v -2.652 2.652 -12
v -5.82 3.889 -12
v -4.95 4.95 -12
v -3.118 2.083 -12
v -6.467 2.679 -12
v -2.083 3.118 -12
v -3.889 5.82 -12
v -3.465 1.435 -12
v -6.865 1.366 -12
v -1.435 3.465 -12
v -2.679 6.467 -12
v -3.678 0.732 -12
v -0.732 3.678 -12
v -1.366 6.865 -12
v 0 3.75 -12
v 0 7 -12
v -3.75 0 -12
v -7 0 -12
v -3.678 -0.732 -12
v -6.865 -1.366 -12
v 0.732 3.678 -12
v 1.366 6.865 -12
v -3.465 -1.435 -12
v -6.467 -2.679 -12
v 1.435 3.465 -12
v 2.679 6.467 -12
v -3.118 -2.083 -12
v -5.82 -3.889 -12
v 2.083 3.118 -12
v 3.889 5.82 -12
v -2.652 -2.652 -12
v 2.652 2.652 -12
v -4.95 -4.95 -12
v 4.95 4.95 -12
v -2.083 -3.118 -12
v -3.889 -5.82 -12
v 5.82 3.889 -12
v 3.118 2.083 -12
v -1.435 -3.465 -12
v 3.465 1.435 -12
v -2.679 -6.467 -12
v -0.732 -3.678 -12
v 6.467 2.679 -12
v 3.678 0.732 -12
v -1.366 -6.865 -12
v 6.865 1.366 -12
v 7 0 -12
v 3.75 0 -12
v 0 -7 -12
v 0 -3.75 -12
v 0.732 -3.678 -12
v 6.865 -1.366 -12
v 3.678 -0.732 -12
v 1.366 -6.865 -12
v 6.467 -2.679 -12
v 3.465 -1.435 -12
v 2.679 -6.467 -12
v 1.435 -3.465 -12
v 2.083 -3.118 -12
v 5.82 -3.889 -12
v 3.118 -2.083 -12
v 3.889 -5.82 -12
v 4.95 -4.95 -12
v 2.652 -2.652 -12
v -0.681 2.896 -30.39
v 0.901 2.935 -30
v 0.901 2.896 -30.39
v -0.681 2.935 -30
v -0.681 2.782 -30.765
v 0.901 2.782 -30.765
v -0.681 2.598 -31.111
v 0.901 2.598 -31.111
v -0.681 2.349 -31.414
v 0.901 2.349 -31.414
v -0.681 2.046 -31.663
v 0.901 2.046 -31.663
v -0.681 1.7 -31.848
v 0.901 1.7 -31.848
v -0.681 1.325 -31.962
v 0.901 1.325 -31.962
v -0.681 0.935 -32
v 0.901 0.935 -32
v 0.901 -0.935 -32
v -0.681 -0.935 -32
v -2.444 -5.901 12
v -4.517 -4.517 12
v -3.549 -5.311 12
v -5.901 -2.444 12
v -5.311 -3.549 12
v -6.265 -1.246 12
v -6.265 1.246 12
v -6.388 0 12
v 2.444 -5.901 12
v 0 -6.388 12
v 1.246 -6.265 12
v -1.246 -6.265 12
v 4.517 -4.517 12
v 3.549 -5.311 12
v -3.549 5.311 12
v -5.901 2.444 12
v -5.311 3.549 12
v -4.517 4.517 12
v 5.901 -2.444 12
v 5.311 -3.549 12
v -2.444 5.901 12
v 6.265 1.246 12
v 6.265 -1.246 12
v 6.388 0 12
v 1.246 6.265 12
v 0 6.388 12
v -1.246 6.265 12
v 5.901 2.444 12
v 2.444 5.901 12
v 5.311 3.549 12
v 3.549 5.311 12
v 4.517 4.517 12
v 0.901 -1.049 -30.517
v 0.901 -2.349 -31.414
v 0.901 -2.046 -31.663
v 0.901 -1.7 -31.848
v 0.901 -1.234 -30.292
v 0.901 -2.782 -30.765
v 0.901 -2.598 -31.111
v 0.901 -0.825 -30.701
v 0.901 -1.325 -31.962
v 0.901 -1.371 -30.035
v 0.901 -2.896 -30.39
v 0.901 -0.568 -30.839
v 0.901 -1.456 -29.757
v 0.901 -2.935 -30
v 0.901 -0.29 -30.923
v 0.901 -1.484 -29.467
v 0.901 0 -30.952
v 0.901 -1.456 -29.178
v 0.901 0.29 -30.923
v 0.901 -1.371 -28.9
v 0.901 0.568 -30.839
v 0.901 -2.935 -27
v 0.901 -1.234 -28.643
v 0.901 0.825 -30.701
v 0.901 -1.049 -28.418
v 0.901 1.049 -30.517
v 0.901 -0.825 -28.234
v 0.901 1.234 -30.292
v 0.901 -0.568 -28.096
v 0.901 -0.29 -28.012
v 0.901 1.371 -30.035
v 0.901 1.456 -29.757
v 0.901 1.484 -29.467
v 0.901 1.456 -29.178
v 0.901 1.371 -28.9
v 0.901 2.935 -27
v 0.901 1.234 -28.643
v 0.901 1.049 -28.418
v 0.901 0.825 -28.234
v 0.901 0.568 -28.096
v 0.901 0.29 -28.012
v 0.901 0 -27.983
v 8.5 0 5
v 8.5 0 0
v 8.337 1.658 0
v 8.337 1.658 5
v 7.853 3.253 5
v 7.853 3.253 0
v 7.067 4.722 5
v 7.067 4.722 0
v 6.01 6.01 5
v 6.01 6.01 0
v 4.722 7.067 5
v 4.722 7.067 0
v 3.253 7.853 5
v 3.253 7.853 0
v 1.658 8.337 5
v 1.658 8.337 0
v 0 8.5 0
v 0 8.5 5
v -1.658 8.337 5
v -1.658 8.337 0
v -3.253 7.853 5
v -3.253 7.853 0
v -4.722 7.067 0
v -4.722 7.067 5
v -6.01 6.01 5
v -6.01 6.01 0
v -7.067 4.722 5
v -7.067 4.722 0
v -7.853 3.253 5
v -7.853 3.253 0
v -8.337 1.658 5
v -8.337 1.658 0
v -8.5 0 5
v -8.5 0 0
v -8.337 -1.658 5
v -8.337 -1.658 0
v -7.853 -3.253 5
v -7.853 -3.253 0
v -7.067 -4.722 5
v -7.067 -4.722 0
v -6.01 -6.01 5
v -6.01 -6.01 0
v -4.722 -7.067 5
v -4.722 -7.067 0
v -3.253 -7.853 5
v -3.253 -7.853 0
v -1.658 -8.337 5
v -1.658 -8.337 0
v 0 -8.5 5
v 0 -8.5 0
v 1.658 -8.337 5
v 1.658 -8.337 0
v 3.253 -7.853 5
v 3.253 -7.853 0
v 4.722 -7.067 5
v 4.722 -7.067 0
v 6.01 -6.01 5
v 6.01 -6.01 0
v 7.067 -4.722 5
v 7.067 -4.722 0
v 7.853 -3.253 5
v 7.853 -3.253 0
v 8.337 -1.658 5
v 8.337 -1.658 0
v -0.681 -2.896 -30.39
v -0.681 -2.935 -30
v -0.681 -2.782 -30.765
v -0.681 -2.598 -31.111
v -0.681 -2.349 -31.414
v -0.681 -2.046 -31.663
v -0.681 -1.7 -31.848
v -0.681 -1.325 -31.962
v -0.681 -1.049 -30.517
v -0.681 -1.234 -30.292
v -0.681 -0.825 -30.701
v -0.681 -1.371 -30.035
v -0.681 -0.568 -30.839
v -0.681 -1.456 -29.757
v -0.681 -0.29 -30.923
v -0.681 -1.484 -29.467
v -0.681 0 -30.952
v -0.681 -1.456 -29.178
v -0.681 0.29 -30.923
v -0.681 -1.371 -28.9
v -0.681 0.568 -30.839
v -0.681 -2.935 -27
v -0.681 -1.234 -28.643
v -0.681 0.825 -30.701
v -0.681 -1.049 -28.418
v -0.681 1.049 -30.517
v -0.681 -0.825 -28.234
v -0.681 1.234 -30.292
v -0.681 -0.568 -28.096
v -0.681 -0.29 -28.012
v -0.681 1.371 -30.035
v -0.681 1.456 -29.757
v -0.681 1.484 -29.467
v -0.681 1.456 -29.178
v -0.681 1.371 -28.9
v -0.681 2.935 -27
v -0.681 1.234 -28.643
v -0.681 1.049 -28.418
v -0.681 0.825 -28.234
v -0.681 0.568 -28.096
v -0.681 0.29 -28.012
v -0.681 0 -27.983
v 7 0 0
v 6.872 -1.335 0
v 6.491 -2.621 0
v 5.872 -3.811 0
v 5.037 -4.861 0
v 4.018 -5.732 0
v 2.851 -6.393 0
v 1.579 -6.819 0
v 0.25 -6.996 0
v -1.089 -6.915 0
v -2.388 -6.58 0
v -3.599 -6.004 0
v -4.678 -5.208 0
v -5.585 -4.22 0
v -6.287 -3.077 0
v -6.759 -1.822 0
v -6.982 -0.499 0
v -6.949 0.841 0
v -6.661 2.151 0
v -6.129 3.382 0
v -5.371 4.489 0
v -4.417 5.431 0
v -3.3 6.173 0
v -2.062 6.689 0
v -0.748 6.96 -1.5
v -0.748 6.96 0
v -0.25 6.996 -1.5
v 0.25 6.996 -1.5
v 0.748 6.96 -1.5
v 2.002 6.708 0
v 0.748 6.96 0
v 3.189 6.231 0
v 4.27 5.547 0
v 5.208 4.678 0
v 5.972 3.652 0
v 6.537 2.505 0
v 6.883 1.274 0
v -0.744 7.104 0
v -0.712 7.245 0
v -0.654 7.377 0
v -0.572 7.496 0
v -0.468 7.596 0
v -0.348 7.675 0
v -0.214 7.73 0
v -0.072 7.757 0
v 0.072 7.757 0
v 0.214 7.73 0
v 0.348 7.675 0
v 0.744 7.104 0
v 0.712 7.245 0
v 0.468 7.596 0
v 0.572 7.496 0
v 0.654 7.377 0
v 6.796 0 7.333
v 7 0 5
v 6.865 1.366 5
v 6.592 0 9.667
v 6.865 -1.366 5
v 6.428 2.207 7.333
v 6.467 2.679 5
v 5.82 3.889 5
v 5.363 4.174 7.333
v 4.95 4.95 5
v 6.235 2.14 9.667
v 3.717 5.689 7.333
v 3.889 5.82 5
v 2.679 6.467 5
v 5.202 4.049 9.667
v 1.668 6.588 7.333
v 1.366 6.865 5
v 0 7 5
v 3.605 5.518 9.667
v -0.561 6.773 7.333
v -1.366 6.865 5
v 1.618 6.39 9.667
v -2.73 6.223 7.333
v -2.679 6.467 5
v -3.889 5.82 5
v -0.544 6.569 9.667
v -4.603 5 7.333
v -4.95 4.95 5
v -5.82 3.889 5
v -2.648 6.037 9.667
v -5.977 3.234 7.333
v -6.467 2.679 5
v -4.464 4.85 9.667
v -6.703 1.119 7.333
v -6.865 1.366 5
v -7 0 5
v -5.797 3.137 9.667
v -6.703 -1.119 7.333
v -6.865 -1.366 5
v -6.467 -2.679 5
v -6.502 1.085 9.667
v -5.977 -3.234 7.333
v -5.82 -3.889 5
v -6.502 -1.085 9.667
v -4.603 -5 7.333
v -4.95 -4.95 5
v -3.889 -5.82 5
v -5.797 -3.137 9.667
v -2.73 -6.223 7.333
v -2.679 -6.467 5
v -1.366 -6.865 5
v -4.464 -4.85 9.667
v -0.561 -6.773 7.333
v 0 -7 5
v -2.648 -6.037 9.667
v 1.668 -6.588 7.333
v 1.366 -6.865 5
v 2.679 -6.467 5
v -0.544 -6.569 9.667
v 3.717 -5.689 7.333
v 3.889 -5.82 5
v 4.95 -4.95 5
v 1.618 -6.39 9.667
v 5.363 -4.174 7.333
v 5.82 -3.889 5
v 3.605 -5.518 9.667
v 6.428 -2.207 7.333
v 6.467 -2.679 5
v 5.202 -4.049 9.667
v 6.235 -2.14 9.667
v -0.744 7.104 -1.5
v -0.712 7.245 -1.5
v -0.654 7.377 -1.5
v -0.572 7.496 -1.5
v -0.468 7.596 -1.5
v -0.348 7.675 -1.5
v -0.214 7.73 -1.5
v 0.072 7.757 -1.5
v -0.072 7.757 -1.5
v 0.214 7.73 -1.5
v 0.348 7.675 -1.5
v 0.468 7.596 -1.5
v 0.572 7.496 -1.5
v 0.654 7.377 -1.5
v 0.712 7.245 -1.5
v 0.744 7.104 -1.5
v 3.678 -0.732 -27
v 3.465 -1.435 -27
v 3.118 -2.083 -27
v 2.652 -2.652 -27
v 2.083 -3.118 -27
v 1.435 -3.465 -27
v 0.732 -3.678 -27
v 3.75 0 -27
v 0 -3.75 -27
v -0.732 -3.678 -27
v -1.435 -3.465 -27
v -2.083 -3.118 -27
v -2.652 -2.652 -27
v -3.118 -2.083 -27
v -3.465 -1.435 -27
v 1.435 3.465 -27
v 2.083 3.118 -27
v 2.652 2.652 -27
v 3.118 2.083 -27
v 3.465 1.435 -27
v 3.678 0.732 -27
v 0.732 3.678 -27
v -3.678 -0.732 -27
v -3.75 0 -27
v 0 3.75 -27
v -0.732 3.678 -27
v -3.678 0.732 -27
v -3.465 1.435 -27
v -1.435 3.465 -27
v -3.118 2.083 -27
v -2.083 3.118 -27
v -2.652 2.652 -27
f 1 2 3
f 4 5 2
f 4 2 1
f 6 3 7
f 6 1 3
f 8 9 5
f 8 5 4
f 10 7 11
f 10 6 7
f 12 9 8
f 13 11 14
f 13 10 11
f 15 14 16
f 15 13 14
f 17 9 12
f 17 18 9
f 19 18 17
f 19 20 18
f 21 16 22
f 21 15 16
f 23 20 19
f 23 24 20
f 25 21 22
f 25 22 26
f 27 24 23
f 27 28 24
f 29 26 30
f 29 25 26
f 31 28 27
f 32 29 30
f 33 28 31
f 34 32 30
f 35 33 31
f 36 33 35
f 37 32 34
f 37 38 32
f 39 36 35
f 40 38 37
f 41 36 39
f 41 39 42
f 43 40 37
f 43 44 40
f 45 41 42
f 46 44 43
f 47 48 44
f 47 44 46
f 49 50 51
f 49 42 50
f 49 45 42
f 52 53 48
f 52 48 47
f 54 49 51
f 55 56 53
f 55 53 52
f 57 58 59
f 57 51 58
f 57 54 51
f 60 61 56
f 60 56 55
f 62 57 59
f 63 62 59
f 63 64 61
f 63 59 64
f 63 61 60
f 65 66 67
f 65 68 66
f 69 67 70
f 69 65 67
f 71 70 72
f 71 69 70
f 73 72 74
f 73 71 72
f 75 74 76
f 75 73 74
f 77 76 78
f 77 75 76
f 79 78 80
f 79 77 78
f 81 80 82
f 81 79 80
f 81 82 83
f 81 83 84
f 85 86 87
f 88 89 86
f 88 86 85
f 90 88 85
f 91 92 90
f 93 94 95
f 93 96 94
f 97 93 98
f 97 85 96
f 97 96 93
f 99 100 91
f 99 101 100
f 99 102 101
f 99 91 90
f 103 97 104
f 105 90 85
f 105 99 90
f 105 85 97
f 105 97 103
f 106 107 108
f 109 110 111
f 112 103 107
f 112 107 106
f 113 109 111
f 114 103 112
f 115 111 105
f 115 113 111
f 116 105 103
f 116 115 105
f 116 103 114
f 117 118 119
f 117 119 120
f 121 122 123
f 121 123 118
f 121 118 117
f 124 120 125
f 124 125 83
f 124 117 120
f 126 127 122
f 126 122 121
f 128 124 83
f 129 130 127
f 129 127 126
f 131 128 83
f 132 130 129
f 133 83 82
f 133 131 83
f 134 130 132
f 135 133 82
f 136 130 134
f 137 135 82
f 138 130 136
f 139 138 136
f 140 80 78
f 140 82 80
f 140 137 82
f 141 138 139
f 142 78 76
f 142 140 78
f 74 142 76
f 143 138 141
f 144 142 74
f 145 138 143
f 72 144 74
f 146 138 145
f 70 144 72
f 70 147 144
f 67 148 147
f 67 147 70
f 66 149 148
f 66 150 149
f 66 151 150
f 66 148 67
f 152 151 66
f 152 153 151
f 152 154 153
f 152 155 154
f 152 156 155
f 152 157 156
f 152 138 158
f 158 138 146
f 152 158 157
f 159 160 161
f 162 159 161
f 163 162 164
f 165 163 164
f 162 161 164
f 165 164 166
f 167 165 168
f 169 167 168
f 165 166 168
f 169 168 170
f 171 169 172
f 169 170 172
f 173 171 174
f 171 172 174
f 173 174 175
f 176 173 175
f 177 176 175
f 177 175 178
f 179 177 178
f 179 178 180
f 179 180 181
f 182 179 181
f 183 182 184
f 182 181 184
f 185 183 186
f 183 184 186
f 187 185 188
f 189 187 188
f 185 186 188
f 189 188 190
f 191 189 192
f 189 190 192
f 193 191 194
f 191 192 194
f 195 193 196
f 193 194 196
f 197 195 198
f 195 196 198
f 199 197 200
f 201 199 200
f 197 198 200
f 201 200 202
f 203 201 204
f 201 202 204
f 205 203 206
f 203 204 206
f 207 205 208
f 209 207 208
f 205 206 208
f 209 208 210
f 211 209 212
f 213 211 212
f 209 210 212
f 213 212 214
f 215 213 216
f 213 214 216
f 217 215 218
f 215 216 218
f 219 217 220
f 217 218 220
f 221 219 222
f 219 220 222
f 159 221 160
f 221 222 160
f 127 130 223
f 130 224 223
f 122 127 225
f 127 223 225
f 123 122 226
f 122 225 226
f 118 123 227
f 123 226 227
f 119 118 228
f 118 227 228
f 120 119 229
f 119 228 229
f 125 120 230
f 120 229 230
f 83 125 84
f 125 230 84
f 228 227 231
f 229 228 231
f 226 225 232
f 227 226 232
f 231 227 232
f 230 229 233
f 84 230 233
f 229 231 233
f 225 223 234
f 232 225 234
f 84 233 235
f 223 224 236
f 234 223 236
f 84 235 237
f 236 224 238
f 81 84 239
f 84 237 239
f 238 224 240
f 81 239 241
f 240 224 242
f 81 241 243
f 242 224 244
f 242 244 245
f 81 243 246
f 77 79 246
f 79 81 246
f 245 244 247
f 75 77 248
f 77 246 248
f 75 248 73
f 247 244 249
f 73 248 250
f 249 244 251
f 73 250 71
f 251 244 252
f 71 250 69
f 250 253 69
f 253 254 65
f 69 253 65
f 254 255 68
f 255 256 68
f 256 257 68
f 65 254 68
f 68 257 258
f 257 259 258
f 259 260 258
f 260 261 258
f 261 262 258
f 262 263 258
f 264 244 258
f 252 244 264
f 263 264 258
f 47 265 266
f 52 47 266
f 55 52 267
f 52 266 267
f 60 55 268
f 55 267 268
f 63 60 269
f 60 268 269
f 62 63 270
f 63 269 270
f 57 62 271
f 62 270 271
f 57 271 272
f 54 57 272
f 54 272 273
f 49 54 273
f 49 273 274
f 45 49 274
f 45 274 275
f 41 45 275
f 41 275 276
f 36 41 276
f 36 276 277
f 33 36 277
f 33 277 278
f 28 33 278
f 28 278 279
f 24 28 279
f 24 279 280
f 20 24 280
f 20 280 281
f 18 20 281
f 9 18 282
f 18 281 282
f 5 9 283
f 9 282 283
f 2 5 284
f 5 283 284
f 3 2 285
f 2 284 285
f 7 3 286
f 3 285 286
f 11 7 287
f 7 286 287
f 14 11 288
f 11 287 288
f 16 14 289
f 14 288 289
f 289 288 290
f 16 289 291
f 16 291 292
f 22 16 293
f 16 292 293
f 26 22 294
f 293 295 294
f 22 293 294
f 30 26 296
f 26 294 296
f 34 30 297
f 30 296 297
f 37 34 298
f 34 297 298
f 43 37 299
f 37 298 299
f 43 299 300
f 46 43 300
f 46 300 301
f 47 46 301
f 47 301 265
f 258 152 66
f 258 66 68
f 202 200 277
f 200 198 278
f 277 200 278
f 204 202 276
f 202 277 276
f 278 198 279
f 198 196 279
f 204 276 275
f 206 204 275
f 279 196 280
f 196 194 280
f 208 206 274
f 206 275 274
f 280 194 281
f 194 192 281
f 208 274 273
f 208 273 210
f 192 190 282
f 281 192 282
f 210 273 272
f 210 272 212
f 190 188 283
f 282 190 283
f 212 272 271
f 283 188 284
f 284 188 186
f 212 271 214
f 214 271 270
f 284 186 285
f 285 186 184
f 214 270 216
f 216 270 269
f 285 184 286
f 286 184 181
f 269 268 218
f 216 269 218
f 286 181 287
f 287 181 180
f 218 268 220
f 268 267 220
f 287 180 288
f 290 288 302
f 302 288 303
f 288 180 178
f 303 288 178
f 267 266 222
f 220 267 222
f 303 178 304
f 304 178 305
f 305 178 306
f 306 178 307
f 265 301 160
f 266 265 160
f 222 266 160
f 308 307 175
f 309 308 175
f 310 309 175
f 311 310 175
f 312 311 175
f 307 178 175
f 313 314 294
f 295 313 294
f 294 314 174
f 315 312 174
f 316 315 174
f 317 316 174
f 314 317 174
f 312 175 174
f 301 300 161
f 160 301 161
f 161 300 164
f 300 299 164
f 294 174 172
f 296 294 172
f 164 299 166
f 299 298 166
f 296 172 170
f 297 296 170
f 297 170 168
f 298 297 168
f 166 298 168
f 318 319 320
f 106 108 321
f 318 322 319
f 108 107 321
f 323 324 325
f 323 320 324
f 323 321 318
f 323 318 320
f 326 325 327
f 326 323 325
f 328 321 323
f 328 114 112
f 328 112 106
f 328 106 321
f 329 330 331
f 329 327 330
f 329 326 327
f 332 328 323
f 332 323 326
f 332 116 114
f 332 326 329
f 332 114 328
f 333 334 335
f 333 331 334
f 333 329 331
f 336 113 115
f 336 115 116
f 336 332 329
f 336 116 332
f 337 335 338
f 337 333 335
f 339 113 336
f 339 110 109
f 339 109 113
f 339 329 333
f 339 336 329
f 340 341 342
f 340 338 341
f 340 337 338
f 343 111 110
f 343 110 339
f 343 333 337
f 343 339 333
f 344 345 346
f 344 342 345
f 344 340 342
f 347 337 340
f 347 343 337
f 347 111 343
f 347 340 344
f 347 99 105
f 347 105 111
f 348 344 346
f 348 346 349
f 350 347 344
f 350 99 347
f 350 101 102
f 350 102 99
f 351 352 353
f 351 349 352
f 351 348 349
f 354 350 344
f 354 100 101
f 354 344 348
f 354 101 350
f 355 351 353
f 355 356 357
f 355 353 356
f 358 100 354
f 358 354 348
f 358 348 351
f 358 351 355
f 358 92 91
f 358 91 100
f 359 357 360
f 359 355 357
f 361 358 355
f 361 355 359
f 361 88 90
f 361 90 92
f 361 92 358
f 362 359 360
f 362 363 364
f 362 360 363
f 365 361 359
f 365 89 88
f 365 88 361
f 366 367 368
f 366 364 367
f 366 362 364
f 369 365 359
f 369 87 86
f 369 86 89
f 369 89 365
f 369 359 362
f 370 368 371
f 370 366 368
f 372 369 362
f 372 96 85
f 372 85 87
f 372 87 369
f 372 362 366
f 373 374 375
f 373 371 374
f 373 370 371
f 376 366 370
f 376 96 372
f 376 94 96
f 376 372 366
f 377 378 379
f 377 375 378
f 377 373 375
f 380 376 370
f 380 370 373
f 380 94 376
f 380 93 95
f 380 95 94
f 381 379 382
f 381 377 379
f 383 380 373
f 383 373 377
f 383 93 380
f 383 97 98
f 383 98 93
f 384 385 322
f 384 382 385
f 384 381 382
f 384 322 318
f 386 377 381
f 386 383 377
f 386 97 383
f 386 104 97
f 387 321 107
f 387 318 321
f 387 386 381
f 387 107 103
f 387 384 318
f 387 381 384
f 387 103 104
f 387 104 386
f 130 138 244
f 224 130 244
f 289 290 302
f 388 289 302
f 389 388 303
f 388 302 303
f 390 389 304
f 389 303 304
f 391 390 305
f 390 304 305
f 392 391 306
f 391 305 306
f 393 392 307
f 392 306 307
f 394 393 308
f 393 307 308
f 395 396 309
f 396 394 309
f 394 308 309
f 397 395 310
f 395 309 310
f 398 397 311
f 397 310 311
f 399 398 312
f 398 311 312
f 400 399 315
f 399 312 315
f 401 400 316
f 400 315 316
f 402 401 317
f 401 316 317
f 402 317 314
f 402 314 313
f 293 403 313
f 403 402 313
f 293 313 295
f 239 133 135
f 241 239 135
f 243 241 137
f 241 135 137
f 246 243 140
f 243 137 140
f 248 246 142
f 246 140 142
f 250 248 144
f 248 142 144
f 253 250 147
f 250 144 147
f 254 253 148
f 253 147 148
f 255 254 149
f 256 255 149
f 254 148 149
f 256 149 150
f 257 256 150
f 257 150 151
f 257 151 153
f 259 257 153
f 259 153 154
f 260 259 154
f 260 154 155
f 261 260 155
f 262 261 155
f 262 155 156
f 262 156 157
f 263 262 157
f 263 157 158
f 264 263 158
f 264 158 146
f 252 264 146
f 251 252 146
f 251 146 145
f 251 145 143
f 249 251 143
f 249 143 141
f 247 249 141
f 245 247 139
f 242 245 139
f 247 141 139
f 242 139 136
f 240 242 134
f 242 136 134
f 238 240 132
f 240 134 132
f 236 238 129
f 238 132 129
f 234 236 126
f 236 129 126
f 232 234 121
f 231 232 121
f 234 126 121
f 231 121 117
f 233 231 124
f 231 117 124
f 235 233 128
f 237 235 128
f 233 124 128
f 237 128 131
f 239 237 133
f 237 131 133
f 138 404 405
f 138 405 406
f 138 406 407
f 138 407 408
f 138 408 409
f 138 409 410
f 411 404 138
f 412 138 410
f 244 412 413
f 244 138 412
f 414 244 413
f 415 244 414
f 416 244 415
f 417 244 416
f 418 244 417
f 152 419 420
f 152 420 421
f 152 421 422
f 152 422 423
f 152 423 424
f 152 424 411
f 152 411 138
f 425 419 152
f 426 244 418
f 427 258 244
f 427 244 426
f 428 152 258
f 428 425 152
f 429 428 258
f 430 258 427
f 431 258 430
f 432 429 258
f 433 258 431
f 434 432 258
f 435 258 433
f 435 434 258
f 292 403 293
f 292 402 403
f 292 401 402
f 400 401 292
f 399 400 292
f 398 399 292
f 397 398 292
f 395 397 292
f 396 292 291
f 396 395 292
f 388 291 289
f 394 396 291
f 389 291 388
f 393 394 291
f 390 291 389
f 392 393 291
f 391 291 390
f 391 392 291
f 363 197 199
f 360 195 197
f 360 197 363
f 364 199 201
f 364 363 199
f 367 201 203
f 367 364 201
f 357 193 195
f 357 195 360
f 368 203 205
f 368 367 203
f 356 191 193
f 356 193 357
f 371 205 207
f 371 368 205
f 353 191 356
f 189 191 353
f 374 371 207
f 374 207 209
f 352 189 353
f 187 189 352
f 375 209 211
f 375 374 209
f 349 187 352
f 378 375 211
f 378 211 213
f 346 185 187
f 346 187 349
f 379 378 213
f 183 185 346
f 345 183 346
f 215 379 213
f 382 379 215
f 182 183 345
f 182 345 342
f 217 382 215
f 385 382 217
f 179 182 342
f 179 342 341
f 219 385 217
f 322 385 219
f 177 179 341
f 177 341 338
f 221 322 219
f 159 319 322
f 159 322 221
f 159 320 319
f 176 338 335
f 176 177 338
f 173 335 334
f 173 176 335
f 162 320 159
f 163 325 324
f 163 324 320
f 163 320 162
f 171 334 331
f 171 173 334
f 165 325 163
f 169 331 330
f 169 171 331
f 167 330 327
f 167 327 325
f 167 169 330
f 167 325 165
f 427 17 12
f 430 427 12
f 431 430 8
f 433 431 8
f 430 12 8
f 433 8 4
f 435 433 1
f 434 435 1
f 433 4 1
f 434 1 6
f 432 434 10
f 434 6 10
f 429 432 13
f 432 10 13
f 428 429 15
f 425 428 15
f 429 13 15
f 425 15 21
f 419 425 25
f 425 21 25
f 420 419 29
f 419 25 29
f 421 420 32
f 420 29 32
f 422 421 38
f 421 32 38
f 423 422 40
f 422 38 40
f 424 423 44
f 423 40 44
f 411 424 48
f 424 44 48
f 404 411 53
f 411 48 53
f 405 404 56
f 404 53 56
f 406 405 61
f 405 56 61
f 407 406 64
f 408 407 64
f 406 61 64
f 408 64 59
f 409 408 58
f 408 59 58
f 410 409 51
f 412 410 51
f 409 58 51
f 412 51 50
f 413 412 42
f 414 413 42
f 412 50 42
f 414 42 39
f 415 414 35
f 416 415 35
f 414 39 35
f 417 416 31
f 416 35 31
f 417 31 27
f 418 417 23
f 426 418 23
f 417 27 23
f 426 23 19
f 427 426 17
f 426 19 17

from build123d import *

# Parameters (mm, degrees)
SKETCH_1_R          = 8.5
EXTRUDE_1_DEPTH     = 5
SKETCH_2_R          = 7
EXTRUDE_2_DEPTH     = 7
EXTRUDE_2_TAPER     = 5
SKETCH_3_R          = 7
EXTRUDE_3_DEPTH     = 12
SKETCH_4_R          = 3.75
EXTRUDE_4_DEPTH     = 15
SKETCH_5_W          = 1.582755529
SKETCH_5_H          = 5.869385088
EXTRUDE_5_DEPTH     = 5
SKETCH_6_R          = 1.484108277
CUT_EXTRUDE_1_DEPTH = 5
FILLET_1_R          = 2
SKETCH_7_R          = 0.75
EXTRUDE_6_DEPTH     = 1.5


with BuildPart() as part:
    # Эскиз1 → Бобышка-Вытянуть1 (new body)
    with BuildSketch(Plane.XY):
        Circle(SKETCH_1_R)
    extrude(amount=EXTRUDE_1_DEPTH)

    # Эскиз2 → Бобышка-Вытянуть2 (add)
    with BuildSketch(Plane.XY.offset(5)):
        Circle(SKETCH_2_R)
    extrude(amount=EXTRUDE_2_DEPTH, taper=EXTRUDE_2_TAPER)

    # Эскиз3 → Бобышка-Вытянуть3 (add)
    with BuildSketch(Plane(origin=(0, 0, 0), x_dir=(-1, 0, 0), z_dir=(0, 0, -1))):
        with Locations(Location((0, 0, 0), (0, 0, 180))):
            Circle(SKETCH_3_R)
    extrude(amount=EXTRUDE_3_DEPTH)

    # Эскиз4 → Бобышка-Вытянуть4 (add)
    with BuildSketch(Plane(origin=(0, 0, -12), x_dir=(-1, 0, 0), z_dir=(0, 0, -1))):
        Circle(SKETCH_4_R)
    extrude(amount=EXTRUDE_4_DEPTH)

    # Эскиз5 → Бобышка-Вытянуть5 (add)
    with BuildSketch(Plane(origin=(0, 0, -27), x_dir=(-1, 0, 0), z_dir=(0, 0, -1))):
        with Locations((-0.109913578, 0)):
            Rectangle(SKETCH_5_W, SKETCH_5_H)
    extrude(amount=EXTRUDE_5_DEPTH)

    # Эскиз6 → Вырез-Вытянуть1 (cut)
    with BuildSketch(Plane(origin=(0.901291343, 0, 0), x_dir=(0, 0, -1), z_dir=(1, 0, 0))):
        with Locations((29.467495163, 0)):
            Circle(SKETCH_6_R)
    extrude(amount=-CUT_EXTRUDE_1_DEPTH, mode=Mode.SUBTRACT)

    # Скругление1
    fillet_1_edges = [part.edges().sort_by_distance(p)[0] for p in [
        (0.109913578, -2.934692544, -32),
        (0.109913578, 2.934692544, -32),
    ]]
    fillet(fillet_1_edges, radius=FILLET_1_R)

    # Эскиз7 → Бобышка-Вытянуть6 (add)
    with BuildSketch(Plane(origin=(0, 0, 0), x_dir=(-1, 0, 0), z_dir=(0, 0, -1))):
        with Locations((0, 7.010668314)):
            Circle(SKETCH_7_R)
    extrude(amount=EXTRUDE_6_DEPTH)


solid = part.part
